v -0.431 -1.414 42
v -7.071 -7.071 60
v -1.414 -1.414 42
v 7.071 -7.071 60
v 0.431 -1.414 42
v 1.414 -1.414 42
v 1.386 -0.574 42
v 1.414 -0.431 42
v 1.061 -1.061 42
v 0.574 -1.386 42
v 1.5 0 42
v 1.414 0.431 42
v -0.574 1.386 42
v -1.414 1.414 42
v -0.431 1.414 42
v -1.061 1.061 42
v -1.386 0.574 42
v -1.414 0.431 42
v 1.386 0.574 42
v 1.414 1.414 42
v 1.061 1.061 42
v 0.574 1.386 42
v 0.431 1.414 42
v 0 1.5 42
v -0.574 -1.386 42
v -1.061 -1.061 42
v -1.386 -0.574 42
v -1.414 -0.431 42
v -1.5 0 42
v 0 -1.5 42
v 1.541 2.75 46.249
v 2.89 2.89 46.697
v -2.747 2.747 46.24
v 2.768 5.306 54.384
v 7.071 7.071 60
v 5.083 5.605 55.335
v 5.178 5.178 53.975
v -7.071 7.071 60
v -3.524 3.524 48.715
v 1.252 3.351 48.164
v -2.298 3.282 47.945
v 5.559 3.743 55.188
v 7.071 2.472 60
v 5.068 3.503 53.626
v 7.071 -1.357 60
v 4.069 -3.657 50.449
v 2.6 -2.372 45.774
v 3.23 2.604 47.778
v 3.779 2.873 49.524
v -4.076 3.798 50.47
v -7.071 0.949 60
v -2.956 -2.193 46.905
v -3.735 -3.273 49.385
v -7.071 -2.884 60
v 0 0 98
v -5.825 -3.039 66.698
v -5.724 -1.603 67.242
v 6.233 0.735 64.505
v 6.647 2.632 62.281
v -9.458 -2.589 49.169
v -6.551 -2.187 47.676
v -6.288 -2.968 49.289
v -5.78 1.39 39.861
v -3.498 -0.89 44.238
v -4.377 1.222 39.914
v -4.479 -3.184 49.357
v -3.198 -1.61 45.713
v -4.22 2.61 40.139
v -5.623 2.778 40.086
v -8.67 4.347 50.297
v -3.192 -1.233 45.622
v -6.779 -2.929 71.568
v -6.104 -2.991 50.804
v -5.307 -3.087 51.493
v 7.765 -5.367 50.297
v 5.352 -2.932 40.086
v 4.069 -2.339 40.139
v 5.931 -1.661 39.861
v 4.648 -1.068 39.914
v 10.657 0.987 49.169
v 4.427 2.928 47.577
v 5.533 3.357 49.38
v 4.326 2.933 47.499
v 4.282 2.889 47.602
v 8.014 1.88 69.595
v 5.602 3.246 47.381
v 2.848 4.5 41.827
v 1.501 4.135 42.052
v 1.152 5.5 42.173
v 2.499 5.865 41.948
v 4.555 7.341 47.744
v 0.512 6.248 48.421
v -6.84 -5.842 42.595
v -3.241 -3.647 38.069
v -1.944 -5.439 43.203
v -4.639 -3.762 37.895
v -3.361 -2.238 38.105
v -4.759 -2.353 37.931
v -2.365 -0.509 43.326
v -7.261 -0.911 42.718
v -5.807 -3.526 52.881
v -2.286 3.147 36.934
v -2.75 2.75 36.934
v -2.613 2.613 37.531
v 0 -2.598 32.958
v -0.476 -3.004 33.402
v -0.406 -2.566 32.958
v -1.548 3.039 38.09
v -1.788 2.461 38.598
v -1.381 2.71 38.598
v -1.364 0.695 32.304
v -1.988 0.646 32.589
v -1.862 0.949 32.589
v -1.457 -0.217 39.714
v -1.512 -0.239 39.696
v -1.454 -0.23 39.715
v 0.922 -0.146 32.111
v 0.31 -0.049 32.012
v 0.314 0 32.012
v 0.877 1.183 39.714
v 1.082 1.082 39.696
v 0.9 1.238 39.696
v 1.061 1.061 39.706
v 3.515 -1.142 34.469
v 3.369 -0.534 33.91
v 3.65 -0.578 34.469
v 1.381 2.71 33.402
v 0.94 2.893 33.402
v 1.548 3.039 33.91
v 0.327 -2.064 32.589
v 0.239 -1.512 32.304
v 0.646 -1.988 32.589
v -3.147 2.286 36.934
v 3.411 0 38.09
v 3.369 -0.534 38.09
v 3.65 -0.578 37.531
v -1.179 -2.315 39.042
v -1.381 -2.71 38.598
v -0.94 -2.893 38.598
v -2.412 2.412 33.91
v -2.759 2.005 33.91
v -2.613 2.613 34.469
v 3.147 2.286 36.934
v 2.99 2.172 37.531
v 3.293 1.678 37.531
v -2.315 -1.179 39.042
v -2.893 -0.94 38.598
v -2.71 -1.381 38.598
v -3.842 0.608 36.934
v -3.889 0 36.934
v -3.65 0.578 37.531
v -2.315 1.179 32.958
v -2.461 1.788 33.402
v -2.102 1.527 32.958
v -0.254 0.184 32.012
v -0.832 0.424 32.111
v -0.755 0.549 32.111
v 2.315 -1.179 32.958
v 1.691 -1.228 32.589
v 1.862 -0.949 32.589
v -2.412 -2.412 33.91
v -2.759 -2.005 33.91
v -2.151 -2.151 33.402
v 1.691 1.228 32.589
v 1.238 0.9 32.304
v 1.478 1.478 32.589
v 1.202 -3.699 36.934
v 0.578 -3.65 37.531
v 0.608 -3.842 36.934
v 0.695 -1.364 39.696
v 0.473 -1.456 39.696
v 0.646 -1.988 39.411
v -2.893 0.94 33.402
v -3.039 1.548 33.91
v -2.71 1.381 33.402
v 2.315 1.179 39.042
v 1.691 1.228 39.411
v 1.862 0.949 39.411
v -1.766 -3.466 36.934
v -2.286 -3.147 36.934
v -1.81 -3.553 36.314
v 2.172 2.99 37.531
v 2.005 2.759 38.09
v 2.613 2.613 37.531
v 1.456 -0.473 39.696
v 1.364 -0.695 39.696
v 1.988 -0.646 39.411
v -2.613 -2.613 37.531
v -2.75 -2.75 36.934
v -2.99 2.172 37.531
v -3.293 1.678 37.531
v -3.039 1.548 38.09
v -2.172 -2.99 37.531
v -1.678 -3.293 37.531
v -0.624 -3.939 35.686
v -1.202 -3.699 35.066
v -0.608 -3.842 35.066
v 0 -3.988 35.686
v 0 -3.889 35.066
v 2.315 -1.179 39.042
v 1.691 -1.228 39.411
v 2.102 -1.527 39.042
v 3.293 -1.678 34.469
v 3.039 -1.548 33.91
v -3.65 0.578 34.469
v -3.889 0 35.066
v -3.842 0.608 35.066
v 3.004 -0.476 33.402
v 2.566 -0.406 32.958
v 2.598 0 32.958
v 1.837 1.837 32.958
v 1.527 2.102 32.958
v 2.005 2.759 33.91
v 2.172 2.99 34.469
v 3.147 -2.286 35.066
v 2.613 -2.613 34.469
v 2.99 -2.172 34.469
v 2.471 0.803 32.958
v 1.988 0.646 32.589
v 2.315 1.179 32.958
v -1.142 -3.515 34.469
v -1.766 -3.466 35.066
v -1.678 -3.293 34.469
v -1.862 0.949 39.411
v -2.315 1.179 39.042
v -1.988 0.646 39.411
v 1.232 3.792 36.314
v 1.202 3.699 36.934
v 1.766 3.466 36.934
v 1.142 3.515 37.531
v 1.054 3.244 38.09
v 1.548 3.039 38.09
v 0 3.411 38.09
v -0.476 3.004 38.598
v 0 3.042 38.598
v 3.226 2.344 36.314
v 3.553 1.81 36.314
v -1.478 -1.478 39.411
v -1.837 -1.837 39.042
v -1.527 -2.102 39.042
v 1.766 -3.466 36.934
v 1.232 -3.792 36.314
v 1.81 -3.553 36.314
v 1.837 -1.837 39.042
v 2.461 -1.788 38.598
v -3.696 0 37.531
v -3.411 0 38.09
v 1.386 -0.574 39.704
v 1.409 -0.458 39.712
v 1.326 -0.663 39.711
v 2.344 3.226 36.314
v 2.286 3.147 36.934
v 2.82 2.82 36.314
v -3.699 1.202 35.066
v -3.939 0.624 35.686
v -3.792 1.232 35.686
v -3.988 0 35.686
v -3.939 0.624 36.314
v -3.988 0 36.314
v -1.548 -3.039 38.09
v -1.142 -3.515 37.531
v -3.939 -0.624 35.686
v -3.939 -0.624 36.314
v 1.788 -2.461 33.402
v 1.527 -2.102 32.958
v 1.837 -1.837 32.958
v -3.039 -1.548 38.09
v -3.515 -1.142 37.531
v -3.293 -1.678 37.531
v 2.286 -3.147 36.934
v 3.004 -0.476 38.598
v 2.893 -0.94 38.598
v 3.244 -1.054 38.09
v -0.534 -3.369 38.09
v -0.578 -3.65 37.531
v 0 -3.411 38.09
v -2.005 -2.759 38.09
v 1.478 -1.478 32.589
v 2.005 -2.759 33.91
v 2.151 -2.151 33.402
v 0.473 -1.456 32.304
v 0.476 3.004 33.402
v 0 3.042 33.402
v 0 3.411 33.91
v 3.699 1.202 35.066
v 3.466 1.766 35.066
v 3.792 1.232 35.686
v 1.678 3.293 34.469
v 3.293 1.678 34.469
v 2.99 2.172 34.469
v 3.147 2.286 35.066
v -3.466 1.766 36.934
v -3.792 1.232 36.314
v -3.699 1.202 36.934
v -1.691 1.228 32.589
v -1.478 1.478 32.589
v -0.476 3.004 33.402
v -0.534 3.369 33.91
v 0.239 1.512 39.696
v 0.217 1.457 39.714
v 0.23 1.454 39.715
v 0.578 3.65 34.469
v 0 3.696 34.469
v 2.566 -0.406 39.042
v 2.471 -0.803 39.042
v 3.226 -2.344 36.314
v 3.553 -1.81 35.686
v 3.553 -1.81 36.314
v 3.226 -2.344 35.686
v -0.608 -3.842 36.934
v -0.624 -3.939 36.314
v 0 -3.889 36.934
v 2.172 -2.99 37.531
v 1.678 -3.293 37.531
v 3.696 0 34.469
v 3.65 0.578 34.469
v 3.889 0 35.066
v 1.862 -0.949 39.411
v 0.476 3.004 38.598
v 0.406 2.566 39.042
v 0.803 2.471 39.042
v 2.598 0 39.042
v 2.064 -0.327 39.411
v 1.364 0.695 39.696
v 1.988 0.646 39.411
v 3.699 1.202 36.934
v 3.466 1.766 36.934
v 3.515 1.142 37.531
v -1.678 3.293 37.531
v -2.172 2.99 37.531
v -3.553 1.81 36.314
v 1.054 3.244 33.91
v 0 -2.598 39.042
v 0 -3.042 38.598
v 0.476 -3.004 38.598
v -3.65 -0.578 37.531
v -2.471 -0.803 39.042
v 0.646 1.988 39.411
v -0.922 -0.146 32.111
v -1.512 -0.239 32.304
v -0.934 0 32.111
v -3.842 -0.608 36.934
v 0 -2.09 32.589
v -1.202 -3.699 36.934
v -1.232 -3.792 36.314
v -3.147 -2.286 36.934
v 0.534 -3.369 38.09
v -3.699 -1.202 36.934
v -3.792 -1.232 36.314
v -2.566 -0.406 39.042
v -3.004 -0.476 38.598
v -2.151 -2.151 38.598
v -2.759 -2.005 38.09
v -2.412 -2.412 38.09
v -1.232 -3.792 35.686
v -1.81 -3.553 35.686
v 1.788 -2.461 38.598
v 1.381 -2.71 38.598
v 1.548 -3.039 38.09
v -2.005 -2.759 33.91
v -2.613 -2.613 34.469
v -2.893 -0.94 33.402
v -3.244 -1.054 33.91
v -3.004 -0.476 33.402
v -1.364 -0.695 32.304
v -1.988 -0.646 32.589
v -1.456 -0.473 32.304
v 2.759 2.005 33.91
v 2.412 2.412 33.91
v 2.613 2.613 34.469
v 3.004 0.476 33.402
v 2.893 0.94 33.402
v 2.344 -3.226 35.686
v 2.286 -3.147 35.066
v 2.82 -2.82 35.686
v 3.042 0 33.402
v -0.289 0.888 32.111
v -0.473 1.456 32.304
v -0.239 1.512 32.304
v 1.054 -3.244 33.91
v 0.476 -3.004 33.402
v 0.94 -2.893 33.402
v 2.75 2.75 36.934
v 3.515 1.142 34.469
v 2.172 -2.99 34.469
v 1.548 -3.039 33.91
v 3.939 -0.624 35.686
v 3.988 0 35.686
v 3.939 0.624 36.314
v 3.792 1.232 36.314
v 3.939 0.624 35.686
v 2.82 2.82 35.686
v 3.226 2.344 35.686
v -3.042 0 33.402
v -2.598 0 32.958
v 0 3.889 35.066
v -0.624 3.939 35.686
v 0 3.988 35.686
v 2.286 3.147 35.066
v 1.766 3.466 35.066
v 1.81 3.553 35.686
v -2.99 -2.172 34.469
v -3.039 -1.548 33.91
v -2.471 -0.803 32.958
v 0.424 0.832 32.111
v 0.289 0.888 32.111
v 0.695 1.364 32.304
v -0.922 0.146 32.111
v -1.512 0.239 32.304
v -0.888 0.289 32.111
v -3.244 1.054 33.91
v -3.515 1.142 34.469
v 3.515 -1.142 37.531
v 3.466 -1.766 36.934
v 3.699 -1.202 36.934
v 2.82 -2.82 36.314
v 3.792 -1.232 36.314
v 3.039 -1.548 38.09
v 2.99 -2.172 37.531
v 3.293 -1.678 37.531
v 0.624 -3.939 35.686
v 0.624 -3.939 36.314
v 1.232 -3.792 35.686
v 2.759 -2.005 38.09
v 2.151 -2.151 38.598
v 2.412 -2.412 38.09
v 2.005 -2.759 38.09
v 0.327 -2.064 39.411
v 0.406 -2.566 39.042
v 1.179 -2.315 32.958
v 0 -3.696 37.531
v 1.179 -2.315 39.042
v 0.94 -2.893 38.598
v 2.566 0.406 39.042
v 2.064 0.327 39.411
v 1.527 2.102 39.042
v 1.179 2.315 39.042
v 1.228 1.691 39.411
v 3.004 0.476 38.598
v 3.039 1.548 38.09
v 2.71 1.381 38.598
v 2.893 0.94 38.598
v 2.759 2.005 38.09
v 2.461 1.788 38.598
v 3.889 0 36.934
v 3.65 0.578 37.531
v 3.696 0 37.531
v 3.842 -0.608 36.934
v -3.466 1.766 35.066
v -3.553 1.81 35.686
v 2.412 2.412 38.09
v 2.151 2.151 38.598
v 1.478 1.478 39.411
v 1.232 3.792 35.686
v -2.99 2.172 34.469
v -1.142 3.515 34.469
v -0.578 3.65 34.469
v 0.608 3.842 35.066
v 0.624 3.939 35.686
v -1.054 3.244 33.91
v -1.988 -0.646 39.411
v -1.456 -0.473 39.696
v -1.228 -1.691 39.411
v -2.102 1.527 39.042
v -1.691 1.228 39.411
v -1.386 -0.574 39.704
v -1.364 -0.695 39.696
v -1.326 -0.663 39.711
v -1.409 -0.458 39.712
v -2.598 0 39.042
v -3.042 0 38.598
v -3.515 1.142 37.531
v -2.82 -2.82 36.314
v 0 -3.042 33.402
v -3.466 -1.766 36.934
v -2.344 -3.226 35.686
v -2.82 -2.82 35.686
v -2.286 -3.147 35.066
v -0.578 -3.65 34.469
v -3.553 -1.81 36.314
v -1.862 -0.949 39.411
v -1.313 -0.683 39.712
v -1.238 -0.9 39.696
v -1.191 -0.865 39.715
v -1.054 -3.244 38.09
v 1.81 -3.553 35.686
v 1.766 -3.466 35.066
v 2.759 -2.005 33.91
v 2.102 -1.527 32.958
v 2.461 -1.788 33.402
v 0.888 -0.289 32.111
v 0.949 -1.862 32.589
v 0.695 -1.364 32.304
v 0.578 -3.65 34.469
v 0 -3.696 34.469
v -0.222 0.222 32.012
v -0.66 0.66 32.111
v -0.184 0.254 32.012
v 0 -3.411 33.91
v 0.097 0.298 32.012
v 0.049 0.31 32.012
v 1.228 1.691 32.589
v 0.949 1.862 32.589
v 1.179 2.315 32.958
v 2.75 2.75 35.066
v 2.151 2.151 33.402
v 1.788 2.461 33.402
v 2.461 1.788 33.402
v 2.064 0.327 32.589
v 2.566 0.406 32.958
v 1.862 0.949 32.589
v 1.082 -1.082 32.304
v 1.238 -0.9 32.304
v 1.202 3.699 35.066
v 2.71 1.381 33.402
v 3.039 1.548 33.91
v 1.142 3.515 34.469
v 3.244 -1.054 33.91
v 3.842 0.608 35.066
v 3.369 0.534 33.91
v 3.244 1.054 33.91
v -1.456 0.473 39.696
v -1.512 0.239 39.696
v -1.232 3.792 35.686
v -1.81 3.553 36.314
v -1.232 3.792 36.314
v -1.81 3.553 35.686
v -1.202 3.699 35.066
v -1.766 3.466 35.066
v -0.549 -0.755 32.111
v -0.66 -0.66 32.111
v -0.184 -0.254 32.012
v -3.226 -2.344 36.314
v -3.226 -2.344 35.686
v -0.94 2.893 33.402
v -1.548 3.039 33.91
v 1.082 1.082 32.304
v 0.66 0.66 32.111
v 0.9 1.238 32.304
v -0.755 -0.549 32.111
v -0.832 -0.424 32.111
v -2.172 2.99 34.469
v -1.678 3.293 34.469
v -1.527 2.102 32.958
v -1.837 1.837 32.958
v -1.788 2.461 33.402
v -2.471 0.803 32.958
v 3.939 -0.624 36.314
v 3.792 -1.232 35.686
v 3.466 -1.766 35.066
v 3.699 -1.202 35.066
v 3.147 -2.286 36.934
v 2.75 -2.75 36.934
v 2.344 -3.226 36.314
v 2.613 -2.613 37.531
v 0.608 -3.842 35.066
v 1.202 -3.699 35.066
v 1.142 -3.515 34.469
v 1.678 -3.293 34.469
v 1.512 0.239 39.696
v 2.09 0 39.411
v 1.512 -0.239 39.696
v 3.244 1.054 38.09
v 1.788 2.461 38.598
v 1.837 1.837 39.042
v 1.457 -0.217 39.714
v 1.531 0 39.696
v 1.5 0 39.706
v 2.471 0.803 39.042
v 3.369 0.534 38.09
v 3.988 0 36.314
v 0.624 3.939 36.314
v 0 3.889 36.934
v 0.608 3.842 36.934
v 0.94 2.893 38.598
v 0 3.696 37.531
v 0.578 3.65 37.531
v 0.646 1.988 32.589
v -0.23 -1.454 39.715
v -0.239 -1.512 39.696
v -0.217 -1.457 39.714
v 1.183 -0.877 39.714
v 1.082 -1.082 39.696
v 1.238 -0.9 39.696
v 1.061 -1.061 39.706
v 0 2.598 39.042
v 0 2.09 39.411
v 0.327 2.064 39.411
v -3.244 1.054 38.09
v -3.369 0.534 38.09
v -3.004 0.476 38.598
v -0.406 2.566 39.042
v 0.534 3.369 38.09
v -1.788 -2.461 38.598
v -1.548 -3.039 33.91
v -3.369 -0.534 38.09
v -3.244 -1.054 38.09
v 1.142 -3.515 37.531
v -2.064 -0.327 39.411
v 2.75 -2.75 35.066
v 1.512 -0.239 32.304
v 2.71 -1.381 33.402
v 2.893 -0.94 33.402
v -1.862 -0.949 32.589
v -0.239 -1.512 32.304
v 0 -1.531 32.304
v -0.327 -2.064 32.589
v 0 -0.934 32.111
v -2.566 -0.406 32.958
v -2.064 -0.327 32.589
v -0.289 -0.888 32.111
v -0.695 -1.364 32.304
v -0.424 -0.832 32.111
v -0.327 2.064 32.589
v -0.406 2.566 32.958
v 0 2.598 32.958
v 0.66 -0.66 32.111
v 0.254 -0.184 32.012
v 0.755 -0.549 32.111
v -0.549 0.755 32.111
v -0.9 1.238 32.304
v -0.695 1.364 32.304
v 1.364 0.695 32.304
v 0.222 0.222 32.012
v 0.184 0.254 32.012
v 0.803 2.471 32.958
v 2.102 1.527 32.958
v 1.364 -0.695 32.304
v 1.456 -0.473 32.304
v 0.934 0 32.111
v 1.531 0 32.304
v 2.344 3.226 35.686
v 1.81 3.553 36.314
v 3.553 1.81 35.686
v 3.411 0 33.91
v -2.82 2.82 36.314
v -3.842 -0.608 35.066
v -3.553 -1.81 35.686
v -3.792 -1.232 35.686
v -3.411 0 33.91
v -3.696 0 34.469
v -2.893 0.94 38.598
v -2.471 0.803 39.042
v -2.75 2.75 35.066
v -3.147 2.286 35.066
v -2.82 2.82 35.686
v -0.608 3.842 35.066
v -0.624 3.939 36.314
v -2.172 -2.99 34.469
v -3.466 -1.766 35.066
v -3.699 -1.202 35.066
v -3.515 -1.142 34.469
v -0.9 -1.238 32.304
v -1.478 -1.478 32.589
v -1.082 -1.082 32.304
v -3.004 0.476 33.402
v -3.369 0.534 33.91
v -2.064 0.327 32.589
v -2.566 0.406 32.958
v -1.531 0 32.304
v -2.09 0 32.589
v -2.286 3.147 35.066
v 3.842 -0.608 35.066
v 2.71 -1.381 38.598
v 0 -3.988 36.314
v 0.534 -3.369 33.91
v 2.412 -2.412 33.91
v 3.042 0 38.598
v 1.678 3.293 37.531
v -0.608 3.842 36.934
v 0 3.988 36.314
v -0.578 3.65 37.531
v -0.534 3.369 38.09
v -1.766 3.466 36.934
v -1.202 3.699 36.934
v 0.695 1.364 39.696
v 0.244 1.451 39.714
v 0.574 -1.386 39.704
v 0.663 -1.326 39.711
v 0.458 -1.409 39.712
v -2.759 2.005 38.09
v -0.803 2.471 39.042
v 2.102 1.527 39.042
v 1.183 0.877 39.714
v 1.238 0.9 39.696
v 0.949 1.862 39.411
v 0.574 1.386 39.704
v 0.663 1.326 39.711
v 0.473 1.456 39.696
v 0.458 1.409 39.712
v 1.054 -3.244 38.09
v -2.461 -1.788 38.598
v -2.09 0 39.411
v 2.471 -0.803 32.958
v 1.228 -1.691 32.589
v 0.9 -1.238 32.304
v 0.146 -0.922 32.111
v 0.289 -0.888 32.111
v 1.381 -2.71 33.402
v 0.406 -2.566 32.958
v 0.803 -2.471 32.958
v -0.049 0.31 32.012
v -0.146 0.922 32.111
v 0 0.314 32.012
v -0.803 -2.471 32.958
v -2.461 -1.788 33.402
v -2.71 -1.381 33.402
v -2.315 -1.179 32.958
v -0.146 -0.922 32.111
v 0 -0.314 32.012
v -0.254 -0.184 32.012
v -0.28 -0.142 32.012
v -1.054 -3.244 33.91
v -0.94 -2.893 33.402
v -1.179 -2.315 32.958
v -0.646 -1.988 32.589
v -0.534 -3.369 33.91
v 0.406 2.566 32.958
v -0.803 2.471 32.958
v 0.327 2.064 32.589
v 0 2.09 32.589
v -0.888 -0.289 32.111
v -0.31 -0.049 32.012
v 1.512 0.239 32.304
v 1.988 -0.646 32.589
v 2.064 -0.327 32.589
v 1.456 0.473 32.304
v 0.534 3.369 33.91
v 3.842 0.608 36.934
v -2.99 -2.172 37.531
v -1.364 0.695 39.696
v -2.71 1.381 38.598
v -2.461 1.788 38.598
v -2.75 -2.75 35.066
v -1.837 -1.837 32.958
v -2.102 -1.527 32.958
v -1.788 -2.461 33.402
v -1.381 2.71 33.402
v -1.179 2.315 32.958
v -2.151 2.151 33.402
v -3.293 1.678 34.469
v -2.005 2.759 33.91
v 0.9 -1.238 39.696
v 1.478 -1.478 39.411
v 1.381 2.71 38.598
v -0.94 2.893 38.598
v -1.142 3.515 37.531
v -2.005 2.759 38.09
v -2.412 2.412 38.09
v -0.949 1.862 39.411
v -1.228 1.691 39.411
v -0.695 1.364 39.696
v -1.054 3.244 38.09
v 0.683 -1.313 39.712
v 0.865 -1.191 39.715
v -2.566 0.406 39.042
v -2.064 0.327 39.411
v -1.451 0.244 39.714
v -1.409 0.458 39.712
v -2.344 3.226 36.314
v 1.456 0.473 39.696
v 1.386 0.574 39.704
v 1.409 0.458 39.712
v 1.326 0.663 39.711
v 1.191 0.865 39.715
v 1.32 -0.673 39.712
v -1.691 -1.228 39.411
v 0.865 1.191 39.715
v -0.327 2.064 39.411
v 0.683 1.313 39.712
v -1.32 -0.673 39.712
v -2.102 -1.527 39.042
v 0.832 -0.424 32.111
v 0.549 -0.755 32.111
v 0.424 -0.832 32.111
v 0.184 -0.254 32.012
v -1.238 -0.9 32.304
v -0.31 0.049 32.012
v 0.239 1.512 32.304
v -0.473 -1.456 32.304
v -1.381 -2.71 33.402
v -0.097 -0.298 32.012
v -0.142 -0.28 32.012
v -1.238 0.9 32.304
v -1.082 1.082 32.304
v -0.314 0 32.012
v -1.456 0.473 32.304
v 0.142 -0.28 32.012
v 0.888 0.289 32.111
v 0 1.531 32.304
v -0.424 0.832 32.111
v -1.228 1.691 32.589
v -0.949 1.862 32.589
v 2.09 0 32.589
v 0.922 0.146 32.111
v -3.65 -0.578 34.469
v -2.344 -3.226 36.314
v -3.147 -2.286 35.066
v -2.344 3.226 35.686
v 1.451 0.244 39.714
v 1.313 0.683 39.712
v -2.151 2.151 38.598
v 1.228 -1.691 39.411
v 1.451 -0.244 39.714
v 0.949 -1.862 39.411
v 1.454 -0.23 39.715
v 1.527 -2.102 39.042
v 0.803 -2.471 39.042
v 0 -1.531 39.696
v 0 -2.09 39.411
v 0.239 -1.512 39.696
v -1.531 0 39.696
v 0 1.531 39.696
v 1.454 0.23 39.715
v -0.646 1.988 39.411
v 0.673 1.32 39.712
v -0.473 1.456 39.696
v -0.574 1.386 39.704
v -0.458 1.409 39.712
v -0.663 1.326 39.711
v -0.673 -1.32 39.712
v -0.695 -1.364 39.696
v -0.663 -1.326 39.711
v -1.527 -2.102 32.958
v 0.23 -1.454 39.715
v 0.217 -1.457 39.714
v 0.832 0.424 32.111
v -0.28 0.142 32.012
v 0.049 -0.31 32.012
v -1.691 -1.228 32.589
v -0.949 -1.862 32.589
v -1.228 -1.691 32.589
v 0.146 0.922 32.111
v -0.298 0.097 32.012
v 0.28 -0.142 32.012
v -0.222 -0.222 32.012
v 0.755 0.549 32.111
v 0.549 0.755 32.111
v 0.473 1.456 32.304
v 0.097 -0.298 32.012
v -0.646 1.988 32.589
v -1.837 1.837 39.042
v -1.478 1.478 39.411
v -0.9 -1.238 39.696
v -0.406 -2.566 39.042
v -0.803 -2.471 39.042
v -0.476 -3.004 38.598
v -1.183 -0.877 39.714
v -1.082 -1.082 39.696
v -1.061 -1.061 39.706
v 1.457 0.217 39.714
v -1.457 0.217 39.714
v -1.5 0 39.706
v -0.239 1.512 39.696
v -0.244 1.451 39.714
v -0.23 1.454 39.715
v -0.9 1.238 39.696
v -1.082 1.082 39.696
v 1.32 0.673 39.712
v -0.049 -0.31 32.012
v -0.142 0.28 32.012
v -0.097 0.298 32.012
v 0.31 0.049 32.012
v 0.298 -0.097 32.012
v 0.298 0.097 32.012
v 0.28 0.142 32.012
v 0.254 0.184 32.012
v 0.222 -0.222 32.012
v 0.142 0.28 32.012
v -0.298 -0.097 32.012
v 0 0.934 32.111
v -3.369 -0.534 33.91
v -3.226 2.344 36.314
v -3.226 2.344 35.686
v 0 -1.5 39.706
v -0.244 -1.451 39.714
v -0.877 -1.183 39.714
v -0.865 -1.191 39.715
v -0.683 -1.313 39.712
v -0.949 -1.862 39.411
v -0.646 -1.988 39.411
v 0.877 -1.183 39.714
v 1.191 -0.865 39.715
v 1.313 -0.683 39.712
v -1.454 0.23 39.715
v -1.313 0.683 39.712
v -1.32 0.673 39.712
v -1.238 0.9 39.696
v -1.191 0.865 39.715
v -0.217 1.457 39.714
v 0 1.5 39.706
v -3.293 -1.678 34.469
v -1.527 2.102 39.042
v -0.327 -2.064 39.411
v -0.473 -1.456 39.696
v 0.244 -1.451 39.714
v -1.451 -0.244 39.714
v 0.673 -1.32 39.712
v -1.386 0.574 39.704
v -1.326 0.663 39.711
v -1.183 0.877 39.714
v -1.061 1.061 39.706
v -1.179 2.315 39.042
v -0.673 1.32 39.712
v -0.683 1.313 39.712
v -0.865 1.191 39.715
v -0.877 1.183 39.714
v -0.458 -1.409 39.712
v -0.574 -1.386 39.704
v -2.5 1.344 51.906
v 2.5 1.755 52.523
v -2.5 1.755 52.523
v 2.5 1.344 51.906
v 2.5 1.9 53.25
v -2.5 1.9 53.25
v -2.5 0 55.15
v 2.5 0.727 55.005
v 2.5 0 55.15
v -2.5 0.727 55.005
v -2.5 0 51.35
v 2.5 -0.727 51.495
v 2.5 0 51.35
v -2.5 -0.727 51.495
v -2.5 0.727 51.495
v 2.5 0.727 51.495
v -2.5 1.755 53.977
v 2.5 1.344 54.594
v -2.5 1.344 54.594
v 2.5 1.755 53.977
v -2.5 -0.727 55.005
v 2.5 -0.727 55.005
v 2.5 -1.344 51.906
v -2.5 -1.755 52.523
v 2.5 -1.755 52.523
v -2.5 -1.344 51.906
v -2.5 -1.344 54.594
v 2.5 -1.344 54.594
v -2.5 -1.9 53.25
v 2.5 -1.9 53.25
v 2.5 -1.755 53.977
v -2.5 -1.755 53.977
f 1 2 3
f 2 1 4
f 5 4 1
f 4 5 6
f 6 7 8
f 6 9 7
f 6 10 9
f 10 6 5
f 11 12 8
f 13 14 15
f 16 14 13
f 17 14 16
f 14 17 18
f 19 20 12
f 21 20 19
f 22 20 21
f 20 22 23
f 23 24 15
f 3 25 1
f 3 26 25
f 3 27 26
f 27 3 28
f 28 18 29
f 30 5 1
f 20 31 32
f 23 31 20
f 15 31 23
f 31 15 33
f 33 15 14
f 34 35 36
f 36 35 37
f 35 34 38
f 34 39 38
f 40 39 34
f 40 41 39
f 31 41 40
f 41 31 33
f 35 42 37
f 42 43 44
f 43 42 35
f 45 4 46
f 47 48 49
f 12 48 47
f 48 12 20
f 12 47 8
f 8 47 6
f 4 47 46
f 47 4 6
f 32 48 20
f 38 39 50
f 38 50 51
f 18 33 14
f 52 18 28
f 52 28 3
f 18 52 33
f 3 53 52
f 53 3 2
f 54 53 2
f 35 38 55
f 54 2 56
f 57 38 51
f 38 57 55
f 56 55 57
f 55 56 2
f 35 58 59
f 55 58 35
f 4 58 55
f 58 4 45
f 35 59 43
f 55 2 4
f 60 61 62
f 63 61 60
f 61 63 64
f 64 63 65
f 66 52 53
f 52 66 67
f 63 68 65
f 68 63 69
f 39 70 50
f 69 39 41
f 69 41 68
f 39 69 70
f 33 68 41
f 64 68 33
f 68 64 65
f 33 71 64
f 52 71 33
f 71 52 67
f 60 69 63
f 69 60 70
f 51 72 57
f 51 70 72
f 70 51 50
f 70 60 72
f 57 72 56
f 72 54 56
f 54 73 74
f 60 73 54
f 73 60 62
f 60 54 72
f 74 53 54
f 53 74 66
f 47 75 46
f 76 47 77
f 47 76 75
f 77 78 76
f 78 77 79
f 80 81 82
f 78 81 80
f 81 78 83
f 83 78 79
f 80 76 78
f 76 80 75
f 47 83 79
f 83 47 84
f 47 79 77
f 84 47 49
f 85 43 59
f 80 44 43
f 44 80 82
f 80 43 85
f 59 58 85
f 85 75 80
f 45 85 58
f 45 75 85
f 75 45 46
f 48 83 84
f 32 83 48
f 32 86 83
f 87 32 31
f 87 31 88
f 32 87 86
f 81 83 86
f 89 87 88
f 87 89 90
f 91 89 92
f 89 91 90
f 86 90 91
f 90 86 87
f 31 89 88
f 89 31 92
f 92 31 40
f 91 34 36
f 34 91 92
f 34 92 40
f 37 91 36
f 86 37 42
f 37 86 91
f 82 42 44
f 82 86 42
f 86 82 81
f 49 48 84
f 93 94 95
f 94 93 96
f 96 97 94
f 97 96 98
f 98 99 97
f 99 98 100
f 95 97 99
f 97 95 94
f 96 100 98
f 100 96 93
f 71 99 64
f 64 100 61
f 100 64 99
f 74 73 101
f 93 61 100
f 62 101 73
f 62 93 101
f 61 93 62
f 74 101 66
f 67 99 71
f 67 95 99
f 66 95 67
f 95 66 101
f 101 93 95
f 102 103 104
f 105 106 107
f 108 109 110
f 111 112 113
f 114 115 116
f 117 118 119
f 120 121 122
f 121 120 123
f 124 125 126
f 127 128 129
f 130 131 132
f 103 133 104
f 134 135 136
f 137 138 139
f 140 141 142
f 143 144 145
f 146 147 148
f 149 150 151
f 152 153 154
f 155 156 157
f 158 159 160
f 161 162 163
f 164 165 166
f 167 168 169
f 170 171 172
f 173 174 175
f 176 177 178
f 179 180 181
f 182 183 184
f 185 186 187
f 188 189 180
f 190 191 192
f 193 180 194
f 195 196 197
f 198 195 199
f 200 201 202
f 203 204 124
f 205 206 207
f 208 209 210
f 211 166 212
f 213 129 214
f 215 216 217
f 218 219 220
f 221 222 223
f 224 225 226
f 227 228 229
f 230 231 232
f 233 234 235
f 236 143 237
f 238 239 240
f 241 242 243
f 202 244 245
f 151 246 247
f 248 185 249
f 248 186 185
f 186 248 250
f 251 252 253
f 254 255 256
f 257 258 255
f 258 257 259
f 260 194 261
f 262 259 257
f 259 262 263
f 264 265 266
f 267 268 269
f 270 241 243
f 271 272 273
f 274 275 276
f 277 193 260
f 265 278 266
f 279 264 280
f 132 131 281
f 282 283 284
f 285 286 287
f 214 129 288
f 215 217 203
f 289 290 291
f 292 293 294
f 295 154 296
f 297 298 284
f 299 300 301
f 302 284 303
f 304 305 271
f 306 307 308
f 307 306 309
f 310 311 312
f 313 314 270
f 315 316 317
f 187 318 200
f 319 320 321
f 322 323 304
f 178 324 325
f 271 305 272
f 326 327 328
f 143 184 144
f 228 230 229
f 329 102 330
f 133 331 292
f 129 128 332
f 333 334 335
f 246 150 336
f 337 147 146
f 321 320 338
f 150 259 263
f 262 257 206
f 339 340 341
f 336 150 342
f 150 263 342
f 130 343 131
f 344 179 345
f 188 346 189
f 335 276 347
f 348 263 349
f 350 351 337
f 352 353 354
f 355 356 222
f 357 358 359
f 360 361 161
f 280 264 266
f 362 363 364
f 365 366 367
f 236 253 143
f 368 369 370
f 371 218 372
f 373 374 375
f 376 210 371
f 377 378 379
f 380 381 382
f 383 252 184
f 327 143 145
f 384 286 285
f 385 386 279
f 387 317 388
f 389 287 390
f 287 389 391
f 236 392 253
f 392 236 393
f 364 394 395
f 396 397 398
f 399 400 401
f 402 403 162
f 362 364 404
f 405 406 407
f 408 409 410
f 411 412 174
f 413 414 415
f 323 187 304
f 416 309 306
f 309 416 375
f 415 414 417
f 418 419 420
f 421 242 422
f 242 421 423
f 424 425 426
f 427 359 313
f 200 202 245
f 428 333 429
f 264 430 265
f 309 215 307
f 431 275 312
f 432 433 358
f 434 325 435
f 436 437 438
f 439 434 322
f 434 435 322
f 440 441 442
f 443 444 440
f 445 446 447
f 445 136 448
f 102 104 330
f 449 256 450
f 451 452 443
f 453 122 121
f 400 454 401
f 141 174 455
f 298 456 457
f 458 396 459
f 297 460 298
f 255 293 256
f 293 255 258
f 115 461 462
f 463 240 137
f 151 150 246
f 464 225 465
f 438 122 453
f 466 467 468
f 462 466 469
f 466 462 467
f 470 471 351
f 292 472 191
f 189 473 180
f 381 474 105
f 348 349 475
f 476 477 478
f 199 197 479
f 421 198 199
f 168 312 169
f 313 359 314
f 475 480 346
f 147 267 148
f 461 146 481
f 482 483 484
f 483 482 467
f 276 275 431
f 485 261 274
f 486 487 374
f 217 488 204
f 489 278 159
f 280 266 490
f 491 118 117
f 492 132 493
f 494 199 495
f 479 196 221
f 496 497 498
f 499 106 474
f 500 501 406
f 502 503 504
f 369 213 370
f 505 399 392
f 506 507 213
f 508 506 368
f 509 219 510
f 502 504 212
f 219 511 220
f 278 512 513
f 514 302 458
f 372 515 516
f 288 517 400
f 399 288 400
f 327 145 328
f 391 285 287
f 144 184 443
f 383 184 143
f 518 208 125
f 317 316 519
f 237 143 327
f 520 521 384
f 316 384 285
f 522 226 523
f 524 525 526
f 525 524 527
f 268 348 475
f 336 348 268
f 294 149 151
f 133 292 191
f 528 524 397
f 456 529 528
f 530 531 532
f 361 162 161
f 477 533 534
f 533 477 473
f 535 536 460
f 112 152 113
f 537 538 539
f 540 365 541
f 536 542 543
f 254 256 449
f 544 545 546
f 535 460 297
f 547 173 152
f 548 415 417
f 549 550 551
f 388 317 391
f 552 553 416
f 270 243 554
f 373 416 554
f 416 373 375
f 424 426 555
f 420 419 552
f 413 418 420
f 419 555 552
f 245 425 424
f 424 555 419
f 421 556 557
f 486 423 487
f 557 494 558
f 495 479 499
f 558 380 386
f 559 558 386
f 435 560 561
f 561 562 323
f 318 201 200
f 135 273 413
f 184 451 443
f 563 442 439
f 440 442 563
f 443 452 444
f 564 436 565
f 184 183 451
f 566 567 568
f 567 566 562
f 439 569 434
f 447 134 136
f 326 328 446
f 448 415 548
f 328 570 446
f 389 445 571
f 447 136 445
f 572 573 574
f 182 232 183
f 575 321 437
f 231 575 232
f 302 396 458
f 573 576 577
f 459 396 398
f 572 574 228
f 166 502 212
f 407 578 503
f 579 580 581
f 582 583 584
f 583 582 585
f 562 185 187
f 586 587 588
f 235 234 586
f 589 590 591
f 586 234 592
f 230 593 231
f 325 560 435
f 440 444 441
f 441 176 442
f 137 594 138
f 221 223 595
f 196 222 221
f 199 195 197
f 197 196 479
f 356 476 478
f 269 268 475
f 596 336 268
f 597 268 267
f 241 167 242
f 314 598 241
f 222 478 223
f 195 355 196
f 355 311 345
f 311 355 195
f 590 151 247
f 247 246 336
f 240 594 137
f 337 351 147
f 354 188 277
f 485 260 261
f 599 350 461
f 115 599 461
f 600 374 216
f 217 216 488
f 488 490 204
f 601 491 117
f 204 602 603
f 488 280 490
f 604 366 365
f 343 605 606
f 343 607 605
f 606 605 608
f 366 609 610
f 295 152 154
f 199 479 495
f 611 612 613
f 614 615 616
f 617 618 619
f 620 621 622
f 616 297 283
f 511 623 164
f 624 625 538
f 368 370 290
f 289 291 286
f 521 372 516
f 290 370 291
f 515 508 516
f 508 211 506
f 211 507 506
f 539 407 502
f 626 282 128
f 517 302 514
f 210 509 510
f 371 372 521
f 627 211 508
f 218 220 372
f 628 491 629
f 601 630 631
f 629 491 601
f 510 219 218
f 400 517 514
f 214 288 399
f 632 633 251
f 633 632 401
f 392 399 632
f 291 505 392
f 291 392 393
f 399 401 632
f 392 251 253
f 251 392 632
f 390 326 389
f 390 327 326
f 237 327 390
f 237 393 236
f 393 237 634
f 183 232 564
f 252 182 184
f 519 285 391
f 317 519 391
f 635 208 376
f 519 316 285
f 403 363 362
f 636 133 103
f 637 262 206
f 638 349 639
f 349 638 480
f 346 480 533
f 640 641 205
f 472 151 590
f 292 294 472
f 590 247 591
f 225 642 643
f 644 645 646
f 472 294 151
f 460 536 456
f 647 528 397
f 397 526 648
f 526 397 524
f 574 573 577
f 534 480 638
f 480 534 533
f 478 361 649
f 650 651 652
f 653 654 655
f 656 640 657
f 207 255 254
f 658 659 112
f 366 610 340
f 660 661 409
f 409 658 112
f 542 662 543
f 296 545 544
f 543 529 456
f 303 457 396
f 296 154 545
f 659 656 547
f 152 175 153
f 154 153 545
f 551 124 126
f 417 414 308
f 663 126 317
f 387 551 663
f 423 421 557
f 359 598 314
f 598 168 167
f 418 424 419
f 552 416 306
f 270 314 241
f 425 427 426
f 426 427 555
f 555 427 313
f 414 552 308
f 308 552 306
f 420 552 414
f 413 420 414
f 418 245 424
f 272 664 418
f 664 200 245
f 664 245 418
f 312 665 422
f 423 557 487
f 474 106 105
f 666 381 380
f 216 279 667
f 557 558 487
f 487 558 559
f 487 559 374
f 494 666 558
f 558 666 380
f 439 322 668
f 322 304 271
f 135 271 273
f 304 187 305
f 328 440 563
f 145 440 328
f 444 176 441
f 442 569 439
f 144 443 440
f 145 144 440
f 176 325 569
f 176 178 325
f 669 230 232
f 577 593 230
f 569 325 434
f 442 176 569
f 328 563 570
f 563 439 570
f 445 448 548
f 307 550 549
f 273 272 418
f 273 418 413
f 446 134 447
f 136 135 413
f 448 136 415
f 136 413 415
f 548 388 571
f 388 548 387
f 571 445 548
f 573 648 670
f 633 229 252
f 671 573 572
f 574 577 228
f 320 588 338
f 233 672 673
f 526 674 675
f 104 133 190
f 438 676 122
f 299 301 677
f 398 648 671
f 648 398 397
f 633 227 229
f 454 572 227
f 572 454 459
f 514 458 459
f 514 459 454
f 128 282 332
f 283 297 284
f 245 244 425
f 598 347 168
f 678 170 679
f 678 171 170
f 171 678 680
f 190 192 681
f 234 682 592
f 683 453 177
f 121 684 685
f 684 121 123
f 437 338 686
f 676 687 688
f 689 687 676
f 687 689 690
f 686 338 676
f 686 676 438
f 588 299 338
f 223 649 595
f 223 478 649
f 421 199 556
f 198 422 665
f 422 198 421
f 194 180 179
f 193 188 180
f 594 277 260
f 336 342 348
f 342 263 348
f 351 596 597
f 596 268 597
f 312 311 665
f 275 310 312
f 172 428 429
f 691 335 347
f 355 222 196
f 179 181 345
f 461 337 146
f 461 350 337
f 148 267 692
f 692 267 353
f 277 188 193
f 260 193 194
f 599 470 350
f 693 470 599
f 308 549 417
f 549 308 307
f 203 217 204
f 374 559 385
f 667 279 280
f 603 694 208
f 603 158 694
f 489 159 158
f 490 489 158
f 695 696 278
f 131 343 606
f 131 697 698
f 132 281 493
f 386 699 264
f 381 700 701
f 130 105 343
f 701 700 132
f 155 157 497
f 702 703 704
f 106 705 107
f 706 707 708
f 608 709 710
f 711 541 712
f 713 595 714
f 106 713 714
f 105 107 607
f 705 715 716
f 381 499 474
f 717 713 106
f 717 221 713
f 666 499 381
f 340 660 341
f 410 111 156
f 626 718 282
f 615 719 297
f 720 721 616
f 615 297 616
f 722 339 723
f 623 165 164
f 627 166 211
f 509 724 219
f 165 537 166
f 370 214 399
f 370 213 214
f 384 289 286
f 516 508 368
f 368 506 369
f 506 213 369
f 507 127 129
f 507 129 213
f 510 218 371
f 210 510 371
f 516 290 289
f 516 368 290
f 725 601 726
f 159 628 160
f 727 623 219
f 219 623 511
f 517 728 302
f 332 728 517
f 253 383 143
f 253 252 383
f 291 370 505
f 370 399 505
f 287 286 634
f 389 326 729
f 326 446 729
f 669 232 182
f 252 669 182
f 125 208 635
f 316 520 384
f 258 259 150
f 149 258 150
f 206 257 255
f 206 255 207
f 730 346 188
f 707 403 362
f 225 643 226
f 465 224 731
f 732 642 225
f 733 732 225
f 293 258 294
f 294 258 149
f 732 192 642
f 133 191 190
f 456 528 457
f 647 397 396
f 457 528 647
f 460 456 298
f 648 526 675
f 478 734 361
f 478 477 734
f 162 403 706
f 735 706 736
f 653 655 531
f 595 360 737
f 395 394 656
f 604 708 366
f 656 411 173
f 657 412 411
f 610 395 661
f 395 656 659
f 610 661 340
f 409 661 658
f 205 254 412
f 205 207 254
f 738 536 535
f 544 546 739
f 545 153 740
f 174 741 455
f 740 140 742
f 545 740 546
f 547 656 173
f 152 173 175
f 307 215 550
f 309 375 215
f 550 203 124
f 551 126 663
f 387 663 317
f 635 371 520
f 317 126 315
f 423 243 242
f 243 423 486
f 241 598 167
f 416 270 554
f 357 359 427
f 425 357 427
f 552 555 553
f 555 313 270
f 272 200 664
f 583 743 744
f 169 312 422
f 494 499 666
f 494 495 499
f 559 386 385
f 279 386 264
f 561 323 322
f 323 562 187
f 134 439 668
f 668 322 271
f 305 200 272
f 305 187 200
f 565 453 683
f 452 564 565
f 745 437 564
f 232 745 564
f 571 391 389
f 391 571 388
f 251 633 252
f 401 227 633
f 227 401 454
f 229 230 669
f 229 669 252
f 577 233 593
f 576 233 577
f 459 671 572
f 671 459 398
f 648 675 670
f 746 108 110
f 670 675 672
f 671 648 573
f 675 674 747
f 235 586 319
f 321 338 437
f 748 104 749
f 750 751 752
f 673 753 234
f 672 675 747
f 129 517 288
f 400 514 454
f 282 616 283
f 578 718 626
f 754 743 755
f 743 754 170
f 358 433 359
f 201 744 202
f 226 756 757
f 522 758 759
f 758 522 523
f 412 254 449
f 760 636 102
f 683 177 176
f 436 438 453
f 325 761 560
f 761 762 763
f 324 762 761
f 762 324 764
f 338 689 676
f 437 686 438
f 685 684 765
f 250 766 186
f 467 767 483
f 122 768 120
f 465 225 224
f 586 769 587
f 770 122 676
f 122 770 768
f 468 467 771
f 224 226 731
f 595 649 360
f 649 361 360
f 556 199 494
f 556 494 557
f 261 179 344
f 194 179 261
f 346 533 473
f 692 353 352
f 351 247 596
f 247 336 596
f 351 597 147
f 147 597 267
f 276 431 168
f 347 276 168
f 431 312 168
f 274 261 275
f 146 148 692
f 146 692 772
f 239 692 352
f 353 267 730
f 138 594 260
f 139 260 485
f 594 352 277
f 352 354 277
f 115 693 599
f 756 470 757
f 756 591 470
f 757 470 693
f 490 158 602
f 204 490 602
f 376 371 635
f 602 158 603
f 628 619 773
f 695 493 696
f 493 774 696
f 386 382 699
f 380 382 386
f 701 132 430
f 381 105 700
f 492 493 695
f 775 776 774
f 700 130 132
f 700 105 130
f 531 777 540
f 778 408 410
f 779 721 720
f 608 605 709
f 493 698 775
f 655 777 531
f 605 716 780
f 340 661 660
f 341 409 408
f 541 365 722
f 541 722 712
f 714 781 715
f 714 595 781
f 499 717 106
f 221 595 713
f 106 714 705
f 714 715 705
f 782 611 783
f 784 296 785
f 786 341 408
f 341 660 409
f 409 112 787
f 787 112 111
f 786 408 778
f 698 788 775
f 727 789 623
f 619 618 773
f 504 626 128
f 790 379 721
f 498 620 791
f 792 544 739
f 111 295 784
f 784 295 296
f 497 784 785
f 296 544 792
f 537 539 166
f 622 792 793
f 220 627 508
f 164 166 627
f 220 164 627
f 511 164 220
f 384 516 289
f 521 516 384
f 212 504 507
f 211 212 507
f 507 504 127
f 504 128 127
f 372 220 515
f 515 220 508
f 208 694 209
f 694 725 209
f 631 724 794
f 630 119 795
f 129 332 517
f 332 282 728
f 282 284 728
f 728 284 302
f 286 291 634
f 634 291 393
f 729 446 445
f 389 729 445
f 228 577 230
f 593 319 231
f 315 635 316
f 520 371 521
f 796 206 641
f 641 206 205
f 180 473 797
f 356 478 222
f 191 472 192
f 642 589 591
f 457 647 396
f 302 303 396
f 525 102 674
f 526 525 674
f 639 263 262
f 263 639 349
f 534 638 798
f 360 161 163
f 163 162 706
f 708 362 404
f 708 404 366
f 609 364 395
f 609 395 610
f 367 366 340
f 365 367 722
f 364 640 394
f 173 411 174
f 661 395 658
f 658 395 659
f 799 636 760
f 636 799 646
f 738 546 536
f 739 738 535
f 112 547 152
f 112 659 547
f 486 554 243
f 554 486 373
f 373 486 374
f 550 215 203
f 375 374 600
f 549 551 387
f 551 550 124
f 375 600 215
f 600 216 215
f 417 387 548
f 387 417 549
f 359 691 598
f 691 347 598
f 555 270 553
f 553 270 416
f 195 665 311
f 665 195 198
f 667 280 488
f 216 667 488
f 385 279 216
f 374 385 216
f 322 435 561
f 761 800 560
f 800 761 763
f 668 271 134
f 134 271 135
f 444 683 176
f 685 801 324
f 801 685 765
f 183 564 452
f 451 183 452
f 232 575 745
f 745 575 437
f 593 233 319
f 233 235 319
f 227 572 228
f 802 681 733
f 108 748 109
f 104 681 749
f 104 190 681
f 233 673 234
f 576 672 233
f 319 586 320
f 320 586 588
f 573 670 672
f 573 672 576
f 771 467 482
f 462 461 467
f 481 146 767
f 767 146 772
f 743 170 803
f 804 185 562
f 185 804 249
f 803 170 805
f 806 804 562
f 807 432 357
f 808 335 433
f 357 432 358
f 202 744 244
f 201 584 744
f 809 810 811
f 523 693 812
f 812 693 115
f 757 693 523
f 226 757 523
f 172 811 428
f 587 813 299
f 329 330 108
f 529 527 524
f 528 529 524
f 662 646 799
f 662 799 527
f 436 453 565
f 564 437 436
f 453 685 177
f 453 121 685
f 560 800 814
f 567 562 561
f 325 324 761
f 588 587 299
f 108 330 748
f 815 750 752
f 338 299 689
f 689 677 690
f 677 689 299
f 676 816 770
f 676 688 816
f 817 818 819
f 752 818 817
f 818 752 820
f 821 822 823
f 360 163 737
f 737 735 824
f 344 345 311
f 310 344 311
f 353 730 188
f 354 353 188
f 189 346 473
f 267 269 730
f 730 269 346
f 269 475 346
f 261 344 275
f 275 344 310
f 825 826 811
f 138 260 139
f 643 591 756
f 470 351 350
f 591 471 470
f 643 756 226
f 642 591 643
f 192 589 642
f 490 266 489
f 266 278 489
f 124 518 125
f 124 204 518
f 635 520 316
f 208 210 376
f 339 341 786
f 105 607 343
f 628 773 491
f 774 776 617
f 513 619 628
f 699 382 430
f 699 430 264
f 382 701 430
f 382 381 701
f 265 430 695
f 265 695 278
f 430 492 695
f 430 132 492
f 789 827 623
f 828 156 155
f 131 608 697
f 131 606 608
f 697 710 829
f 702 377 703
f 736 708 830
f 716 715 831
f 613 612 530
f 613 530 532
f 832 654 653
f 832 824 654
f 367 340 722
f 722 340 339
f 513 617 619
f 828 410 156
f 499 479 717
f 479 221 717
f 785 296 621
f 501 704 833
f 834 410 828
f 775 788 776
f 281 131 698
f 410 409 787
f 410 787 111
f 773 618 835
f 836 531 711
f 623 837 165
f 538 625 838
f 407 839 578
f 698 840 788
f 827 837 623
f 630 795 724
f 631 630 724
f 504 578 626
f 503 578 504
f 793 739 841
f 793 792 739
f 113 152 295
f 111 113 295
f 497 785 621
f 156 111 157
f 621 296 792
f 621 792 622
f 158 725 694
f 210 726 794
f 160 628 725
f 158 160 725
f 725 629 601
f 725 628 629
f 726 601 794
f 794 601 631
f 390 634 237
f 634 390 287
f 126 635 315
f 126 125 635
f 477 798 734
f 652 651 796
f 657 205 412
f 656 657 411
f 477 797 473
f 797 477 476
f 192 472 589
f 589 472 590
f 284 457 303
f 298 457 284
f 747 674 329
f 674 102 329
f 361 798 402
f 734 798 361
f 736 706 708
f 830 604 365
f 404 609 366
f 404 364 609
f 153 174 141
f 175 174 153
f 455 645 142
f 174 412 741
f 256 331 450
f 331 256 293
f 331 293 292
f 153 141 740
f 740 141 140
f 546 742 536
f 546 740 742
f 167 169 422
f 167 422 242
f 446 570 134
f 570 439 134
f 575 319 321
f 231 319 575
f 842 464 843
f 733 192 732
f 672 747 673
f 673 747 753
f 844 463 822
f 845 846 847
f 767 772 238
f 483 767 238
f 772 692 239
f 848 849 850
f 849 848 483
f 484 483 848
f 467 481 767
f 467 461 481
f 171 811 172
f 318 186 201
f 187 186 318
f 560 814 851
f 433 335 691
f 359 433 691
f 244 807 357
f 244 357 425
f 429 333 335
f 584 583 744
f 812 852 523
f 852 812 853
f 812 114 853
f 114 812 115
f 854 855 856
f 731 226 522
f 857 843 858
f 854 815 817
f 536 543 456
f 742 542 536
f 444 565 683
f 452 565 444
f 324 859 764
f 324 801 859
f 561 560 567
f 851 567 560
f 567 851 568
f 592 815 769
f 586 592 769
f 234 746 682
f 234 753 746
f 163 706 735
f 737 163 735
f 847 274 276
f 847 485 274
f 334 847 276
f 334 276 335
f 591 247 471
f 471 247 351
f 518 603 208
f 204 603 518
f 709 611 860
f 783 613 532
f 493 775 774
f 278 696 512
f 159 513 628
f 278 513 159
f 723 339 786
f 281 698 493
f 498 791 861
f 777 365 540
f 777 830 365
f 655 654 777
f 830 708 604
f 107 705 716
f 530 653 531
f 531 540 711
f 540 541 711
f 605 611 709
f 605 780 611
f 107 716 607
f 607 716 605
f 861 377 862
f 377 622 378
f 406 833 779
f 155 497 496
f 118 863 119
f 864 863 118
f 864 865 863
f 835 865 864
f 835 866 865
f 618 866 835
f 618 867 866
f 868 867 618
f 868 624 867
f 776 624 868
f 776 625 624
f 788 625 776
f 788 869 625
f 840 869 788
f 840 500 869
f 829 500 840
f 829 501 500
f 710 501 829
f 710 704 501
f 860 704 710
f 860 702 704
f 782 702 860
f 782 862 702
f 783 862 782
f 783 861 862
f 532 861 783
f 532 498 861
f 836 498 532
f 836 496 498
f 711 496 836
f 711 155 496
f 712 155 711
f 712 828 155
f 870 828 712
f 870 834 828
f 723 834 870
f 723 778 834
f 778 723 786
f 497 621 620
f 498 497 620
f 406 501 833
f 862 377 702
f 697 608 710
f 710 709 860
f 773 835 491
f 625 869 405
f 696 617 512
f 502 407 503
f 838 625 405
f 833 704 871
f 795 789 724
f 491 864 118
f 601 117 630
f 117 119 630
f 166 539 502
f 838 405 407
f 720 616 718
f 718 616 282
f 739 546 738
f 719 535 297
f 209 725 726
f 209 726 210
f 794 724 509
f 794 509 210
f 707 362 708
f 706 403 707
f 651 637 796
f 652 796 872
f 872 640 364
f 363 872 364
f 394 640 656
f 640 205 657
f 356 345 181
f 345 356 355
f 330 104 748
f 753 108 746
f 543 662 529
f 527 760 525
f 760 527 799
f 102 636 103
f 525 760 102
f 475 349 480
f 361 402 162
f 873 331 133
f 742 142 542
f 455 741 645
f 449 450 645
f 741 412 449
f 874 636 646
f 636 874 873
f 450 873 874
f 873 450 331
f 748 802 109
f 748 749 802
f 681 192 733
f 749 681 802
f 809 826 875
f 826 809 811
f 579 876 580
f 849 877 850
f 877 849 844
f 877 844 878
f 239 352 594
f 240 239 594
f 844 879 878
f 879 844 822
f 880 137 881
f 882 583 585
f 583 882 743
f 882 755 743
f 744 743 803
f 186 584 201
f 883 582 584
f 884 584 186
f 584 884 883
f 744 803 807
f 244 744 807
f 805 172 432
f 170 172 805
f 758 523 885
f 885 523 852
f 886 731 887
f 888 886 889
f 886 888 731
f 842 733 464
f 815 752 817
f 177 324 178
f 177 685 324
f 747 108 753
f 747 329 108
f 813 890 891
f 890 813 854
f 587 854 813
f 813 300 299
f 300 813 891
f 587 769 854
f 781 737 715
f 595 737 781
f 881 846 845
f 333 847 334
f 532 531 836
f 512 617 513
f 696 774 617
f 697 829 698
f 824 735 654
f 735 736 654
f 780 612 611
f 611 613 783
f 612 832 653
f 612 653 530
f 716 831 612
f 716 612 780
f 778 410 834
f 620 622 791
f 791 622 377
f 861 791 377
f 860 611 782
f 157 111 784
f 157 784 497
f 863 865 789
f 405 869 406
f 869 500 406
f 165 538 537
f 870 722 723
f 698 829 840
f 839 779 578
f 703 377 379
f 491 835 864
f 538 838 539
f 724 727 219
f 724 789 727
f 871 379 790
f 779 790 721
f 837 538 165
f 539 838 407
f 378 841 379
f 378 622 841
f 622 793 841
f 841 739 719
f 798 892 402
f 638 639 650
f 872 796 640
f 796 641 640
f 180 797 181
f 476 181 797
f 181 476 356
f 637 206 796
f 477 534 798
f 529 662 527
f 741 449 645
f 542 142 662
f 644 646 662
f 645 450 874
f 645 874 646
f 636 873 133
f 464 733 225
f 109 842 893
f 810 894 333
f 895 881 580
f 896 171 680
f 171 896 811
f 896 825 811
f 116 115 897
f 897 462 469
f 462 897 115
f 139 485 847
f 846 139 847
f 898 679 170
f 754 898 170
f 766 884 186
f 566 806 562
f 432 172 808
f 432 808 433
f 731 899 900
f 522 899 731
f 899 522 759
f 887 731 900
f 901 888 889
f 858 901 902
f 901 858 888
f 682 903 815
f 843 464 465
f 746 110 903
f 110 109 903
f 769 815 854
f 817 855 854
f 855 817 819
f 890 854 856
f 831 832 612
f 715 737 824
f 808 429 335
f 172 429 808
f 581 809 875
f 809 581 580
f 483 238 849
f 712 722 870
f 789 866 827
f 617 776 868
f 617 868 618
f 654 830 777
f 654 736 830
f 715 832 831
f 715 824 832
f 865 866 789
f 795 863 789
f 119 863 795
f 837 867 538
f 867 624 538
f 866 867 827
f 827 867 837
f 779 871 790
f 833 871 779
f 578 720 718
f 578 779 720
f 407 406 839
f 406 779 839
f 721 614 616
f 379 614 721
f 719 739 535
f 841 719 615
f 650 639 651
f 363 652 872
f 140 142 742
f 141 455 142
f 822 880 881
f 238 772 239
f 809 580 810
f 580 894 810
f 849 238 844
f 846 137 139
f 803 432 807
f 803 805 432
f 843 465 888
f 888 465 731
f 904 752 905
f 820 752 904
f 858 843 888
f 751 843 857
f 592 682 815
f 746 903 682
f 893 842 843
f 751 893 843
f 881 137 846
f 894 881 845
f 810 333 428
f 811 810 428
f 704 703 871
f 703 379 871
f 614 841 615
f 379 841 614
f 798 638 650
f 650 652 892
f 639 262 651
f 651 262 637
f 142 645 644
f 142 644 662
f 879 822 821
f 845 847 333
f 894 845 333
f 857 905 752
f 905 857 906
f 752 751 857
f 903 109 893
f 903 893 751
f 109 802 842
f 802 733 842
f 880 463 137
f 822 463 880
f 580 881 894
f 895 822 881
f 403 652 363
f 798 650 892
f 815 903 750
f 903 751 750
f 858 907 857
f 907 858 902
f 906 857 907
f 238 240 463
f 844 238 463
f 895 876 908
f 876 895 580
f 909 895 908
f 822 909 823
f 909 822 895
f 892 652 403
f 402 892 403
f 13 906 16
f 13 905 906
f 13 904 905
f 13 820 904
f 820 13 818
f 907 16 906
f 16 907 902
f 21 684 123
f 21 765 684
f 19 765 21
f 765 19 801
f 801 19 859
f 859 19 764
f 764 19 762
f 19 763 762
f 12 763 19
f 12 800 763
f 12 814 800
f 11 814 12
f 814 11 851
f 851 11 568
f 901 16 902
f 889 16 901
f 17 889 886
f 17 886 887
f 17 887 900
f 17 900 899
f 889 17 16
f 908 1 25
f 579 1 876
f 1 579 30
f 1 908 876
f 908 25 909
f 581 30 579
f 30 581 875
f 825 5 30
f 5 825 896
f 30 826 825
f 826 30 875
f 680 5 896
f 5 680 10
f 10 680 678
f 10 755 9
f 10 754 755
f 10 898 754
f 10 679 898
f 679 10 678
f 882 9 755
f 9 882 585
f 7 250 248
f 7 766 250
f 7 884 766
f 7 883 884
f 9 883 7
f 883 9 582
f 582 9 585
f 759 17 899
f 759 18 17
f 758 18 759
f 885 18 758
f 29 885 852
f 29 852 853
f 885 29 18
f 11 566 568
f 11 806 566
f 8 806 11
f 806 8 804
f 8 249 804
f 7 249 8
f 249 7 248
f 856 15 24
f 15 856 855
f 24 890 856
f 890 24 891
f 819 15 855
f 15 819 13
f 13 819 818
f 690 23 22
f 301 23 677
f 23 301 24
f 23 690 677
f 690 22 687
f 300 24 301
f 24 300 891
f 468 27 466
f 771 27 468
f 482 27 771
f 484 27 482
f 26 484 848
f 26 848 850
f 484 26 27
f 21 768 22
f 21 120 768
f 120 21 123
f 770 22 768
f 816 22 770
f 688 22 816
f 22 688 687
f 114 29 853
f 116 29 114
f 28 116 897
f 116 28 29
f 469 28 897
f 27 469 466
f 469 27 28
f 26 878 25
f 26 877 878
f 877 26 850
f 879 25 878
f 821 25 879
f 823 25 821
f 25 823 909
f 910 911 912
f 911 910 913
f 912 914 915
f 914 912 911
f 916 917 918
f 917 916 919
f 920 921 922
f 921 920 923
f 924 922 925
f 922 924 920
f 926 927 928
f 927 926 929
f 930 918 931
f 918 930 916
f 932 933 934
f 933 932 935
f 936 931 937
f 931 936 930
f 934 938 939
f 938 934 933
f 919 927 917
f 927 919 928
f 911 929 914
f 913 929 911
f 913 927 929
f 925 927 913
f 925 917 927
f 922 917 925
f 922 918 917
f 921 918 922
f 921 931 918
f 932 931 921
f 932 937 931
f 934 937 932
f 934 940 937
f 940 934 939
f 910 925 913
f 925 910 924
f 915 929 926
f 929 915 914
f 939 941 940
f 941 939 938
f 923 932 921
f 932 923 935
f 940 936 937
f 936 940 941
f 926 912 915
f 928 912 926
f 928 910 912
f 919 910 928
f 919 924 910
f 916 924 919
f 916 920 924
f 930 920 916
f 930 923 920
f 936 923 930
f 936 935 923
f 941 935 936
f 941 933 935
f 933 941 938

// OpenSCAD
// AETHERYTE – PART 3: CRYSTAL ASSEMBLY (orb + pin + cluster)

$fn = 50;

base1_size = [70, 70, 10];
base2_size = [55, 55, 8];
base3_size = [40, 40, 6];
collar_height = 10;
orb_r = 4;

ring_z = 52;
ring_thickness = 2.5;
support_bar_r = 1.5;
divot_r = support_bar_r + 0.4;
divot_depth = 2.5;

base_top = base1_size[2] + base2_size[2] + base3_size[2];
orb_z = base_top + collar_height + 2;

crystal_assembly();

module crystal_assembly()
{
    difference()
    {
        union()
        {
            // orb – sits in collar socket
            translate([0, 0, orb_z])
                sphere(r = orb_r, $fn = 40);

            // connecting pin: orb to cluster base
            translate([0, 0, orb_z])
                cylinder(h = 6, r = 1.5, $fn = 16);

            // crystal cluster
            crystal_cluster(orb_z + 6);
        }

        // two divots on opposite sides of the crystal body
        // the ring support bars slide in here to hold the ring in place
        for (i = [0 : 1])
        {
            rotate([0, 0, i * 180])
            translate([0, 0, ring_z + ring_thickness / 2])
            rotate([0, 90, 0])
                cylinder(h = divot_depth, r = divot_r, $fn = 16);
        }
    }
}

module crystal_cluster(z0)
{
    // central tall spire
    translate([0, 0, z0])
    rotate([0, 0, 45])
    union()
    {
        cylinder(h = 18, r1 = 2, r2 = 10, $fn = 4);
        translate([0, 0, 18])
            cylinder(h = 38, r1 = 10, r2 = 0, $fn = 4);
    }

    // secondary spire – left
    translate([-5, 2, z0 - 2])
    rotate([5, -8, 38])
    union()
    {
        cylinder(h = 10, r1 = 1, r2 = 5, $fn = 4);
        translate([0, 0, 10])
            cylinder(h = 22, r1 = 5, r2 = 0, $fn = 4);
    }

    // secondary spire – right
    translate([5, -2, z0 - 2])
    rotate([-5, 8, 20])
    union()
    {
        cylinder(h = 10, r1 = 1, r2 = 5, $fn = 4);
        translate([0, 0, 10])
            cylinder(h = 20, r1 = 5, r2 = 0, $fn = 4);
    }

    // small rear accent spire
    translate([2, 5, z0])
    rotate([10, 3, 60])
    union()
    {
        cylinder(h = 6, r1 = 1, r2 = 3, $fn = 4);
        translate([0, 0, 6])
            cylinder(h = 14, r1 = 3, r2 = 0, $fn = 4);
    }

    // lower body cluster fragment
    translate([-4, -3, z0 - 4])
    rotate([-4, -6, 50])
    union()
    {
        cylinder(h = 5, r1 = 1, r2 = 3.5, $fn = 4);
        translate([0, 0, 5])
            cylinder(h = 10, r1 = 3.5, r2 = 0, $fn = 4);
    }
}
